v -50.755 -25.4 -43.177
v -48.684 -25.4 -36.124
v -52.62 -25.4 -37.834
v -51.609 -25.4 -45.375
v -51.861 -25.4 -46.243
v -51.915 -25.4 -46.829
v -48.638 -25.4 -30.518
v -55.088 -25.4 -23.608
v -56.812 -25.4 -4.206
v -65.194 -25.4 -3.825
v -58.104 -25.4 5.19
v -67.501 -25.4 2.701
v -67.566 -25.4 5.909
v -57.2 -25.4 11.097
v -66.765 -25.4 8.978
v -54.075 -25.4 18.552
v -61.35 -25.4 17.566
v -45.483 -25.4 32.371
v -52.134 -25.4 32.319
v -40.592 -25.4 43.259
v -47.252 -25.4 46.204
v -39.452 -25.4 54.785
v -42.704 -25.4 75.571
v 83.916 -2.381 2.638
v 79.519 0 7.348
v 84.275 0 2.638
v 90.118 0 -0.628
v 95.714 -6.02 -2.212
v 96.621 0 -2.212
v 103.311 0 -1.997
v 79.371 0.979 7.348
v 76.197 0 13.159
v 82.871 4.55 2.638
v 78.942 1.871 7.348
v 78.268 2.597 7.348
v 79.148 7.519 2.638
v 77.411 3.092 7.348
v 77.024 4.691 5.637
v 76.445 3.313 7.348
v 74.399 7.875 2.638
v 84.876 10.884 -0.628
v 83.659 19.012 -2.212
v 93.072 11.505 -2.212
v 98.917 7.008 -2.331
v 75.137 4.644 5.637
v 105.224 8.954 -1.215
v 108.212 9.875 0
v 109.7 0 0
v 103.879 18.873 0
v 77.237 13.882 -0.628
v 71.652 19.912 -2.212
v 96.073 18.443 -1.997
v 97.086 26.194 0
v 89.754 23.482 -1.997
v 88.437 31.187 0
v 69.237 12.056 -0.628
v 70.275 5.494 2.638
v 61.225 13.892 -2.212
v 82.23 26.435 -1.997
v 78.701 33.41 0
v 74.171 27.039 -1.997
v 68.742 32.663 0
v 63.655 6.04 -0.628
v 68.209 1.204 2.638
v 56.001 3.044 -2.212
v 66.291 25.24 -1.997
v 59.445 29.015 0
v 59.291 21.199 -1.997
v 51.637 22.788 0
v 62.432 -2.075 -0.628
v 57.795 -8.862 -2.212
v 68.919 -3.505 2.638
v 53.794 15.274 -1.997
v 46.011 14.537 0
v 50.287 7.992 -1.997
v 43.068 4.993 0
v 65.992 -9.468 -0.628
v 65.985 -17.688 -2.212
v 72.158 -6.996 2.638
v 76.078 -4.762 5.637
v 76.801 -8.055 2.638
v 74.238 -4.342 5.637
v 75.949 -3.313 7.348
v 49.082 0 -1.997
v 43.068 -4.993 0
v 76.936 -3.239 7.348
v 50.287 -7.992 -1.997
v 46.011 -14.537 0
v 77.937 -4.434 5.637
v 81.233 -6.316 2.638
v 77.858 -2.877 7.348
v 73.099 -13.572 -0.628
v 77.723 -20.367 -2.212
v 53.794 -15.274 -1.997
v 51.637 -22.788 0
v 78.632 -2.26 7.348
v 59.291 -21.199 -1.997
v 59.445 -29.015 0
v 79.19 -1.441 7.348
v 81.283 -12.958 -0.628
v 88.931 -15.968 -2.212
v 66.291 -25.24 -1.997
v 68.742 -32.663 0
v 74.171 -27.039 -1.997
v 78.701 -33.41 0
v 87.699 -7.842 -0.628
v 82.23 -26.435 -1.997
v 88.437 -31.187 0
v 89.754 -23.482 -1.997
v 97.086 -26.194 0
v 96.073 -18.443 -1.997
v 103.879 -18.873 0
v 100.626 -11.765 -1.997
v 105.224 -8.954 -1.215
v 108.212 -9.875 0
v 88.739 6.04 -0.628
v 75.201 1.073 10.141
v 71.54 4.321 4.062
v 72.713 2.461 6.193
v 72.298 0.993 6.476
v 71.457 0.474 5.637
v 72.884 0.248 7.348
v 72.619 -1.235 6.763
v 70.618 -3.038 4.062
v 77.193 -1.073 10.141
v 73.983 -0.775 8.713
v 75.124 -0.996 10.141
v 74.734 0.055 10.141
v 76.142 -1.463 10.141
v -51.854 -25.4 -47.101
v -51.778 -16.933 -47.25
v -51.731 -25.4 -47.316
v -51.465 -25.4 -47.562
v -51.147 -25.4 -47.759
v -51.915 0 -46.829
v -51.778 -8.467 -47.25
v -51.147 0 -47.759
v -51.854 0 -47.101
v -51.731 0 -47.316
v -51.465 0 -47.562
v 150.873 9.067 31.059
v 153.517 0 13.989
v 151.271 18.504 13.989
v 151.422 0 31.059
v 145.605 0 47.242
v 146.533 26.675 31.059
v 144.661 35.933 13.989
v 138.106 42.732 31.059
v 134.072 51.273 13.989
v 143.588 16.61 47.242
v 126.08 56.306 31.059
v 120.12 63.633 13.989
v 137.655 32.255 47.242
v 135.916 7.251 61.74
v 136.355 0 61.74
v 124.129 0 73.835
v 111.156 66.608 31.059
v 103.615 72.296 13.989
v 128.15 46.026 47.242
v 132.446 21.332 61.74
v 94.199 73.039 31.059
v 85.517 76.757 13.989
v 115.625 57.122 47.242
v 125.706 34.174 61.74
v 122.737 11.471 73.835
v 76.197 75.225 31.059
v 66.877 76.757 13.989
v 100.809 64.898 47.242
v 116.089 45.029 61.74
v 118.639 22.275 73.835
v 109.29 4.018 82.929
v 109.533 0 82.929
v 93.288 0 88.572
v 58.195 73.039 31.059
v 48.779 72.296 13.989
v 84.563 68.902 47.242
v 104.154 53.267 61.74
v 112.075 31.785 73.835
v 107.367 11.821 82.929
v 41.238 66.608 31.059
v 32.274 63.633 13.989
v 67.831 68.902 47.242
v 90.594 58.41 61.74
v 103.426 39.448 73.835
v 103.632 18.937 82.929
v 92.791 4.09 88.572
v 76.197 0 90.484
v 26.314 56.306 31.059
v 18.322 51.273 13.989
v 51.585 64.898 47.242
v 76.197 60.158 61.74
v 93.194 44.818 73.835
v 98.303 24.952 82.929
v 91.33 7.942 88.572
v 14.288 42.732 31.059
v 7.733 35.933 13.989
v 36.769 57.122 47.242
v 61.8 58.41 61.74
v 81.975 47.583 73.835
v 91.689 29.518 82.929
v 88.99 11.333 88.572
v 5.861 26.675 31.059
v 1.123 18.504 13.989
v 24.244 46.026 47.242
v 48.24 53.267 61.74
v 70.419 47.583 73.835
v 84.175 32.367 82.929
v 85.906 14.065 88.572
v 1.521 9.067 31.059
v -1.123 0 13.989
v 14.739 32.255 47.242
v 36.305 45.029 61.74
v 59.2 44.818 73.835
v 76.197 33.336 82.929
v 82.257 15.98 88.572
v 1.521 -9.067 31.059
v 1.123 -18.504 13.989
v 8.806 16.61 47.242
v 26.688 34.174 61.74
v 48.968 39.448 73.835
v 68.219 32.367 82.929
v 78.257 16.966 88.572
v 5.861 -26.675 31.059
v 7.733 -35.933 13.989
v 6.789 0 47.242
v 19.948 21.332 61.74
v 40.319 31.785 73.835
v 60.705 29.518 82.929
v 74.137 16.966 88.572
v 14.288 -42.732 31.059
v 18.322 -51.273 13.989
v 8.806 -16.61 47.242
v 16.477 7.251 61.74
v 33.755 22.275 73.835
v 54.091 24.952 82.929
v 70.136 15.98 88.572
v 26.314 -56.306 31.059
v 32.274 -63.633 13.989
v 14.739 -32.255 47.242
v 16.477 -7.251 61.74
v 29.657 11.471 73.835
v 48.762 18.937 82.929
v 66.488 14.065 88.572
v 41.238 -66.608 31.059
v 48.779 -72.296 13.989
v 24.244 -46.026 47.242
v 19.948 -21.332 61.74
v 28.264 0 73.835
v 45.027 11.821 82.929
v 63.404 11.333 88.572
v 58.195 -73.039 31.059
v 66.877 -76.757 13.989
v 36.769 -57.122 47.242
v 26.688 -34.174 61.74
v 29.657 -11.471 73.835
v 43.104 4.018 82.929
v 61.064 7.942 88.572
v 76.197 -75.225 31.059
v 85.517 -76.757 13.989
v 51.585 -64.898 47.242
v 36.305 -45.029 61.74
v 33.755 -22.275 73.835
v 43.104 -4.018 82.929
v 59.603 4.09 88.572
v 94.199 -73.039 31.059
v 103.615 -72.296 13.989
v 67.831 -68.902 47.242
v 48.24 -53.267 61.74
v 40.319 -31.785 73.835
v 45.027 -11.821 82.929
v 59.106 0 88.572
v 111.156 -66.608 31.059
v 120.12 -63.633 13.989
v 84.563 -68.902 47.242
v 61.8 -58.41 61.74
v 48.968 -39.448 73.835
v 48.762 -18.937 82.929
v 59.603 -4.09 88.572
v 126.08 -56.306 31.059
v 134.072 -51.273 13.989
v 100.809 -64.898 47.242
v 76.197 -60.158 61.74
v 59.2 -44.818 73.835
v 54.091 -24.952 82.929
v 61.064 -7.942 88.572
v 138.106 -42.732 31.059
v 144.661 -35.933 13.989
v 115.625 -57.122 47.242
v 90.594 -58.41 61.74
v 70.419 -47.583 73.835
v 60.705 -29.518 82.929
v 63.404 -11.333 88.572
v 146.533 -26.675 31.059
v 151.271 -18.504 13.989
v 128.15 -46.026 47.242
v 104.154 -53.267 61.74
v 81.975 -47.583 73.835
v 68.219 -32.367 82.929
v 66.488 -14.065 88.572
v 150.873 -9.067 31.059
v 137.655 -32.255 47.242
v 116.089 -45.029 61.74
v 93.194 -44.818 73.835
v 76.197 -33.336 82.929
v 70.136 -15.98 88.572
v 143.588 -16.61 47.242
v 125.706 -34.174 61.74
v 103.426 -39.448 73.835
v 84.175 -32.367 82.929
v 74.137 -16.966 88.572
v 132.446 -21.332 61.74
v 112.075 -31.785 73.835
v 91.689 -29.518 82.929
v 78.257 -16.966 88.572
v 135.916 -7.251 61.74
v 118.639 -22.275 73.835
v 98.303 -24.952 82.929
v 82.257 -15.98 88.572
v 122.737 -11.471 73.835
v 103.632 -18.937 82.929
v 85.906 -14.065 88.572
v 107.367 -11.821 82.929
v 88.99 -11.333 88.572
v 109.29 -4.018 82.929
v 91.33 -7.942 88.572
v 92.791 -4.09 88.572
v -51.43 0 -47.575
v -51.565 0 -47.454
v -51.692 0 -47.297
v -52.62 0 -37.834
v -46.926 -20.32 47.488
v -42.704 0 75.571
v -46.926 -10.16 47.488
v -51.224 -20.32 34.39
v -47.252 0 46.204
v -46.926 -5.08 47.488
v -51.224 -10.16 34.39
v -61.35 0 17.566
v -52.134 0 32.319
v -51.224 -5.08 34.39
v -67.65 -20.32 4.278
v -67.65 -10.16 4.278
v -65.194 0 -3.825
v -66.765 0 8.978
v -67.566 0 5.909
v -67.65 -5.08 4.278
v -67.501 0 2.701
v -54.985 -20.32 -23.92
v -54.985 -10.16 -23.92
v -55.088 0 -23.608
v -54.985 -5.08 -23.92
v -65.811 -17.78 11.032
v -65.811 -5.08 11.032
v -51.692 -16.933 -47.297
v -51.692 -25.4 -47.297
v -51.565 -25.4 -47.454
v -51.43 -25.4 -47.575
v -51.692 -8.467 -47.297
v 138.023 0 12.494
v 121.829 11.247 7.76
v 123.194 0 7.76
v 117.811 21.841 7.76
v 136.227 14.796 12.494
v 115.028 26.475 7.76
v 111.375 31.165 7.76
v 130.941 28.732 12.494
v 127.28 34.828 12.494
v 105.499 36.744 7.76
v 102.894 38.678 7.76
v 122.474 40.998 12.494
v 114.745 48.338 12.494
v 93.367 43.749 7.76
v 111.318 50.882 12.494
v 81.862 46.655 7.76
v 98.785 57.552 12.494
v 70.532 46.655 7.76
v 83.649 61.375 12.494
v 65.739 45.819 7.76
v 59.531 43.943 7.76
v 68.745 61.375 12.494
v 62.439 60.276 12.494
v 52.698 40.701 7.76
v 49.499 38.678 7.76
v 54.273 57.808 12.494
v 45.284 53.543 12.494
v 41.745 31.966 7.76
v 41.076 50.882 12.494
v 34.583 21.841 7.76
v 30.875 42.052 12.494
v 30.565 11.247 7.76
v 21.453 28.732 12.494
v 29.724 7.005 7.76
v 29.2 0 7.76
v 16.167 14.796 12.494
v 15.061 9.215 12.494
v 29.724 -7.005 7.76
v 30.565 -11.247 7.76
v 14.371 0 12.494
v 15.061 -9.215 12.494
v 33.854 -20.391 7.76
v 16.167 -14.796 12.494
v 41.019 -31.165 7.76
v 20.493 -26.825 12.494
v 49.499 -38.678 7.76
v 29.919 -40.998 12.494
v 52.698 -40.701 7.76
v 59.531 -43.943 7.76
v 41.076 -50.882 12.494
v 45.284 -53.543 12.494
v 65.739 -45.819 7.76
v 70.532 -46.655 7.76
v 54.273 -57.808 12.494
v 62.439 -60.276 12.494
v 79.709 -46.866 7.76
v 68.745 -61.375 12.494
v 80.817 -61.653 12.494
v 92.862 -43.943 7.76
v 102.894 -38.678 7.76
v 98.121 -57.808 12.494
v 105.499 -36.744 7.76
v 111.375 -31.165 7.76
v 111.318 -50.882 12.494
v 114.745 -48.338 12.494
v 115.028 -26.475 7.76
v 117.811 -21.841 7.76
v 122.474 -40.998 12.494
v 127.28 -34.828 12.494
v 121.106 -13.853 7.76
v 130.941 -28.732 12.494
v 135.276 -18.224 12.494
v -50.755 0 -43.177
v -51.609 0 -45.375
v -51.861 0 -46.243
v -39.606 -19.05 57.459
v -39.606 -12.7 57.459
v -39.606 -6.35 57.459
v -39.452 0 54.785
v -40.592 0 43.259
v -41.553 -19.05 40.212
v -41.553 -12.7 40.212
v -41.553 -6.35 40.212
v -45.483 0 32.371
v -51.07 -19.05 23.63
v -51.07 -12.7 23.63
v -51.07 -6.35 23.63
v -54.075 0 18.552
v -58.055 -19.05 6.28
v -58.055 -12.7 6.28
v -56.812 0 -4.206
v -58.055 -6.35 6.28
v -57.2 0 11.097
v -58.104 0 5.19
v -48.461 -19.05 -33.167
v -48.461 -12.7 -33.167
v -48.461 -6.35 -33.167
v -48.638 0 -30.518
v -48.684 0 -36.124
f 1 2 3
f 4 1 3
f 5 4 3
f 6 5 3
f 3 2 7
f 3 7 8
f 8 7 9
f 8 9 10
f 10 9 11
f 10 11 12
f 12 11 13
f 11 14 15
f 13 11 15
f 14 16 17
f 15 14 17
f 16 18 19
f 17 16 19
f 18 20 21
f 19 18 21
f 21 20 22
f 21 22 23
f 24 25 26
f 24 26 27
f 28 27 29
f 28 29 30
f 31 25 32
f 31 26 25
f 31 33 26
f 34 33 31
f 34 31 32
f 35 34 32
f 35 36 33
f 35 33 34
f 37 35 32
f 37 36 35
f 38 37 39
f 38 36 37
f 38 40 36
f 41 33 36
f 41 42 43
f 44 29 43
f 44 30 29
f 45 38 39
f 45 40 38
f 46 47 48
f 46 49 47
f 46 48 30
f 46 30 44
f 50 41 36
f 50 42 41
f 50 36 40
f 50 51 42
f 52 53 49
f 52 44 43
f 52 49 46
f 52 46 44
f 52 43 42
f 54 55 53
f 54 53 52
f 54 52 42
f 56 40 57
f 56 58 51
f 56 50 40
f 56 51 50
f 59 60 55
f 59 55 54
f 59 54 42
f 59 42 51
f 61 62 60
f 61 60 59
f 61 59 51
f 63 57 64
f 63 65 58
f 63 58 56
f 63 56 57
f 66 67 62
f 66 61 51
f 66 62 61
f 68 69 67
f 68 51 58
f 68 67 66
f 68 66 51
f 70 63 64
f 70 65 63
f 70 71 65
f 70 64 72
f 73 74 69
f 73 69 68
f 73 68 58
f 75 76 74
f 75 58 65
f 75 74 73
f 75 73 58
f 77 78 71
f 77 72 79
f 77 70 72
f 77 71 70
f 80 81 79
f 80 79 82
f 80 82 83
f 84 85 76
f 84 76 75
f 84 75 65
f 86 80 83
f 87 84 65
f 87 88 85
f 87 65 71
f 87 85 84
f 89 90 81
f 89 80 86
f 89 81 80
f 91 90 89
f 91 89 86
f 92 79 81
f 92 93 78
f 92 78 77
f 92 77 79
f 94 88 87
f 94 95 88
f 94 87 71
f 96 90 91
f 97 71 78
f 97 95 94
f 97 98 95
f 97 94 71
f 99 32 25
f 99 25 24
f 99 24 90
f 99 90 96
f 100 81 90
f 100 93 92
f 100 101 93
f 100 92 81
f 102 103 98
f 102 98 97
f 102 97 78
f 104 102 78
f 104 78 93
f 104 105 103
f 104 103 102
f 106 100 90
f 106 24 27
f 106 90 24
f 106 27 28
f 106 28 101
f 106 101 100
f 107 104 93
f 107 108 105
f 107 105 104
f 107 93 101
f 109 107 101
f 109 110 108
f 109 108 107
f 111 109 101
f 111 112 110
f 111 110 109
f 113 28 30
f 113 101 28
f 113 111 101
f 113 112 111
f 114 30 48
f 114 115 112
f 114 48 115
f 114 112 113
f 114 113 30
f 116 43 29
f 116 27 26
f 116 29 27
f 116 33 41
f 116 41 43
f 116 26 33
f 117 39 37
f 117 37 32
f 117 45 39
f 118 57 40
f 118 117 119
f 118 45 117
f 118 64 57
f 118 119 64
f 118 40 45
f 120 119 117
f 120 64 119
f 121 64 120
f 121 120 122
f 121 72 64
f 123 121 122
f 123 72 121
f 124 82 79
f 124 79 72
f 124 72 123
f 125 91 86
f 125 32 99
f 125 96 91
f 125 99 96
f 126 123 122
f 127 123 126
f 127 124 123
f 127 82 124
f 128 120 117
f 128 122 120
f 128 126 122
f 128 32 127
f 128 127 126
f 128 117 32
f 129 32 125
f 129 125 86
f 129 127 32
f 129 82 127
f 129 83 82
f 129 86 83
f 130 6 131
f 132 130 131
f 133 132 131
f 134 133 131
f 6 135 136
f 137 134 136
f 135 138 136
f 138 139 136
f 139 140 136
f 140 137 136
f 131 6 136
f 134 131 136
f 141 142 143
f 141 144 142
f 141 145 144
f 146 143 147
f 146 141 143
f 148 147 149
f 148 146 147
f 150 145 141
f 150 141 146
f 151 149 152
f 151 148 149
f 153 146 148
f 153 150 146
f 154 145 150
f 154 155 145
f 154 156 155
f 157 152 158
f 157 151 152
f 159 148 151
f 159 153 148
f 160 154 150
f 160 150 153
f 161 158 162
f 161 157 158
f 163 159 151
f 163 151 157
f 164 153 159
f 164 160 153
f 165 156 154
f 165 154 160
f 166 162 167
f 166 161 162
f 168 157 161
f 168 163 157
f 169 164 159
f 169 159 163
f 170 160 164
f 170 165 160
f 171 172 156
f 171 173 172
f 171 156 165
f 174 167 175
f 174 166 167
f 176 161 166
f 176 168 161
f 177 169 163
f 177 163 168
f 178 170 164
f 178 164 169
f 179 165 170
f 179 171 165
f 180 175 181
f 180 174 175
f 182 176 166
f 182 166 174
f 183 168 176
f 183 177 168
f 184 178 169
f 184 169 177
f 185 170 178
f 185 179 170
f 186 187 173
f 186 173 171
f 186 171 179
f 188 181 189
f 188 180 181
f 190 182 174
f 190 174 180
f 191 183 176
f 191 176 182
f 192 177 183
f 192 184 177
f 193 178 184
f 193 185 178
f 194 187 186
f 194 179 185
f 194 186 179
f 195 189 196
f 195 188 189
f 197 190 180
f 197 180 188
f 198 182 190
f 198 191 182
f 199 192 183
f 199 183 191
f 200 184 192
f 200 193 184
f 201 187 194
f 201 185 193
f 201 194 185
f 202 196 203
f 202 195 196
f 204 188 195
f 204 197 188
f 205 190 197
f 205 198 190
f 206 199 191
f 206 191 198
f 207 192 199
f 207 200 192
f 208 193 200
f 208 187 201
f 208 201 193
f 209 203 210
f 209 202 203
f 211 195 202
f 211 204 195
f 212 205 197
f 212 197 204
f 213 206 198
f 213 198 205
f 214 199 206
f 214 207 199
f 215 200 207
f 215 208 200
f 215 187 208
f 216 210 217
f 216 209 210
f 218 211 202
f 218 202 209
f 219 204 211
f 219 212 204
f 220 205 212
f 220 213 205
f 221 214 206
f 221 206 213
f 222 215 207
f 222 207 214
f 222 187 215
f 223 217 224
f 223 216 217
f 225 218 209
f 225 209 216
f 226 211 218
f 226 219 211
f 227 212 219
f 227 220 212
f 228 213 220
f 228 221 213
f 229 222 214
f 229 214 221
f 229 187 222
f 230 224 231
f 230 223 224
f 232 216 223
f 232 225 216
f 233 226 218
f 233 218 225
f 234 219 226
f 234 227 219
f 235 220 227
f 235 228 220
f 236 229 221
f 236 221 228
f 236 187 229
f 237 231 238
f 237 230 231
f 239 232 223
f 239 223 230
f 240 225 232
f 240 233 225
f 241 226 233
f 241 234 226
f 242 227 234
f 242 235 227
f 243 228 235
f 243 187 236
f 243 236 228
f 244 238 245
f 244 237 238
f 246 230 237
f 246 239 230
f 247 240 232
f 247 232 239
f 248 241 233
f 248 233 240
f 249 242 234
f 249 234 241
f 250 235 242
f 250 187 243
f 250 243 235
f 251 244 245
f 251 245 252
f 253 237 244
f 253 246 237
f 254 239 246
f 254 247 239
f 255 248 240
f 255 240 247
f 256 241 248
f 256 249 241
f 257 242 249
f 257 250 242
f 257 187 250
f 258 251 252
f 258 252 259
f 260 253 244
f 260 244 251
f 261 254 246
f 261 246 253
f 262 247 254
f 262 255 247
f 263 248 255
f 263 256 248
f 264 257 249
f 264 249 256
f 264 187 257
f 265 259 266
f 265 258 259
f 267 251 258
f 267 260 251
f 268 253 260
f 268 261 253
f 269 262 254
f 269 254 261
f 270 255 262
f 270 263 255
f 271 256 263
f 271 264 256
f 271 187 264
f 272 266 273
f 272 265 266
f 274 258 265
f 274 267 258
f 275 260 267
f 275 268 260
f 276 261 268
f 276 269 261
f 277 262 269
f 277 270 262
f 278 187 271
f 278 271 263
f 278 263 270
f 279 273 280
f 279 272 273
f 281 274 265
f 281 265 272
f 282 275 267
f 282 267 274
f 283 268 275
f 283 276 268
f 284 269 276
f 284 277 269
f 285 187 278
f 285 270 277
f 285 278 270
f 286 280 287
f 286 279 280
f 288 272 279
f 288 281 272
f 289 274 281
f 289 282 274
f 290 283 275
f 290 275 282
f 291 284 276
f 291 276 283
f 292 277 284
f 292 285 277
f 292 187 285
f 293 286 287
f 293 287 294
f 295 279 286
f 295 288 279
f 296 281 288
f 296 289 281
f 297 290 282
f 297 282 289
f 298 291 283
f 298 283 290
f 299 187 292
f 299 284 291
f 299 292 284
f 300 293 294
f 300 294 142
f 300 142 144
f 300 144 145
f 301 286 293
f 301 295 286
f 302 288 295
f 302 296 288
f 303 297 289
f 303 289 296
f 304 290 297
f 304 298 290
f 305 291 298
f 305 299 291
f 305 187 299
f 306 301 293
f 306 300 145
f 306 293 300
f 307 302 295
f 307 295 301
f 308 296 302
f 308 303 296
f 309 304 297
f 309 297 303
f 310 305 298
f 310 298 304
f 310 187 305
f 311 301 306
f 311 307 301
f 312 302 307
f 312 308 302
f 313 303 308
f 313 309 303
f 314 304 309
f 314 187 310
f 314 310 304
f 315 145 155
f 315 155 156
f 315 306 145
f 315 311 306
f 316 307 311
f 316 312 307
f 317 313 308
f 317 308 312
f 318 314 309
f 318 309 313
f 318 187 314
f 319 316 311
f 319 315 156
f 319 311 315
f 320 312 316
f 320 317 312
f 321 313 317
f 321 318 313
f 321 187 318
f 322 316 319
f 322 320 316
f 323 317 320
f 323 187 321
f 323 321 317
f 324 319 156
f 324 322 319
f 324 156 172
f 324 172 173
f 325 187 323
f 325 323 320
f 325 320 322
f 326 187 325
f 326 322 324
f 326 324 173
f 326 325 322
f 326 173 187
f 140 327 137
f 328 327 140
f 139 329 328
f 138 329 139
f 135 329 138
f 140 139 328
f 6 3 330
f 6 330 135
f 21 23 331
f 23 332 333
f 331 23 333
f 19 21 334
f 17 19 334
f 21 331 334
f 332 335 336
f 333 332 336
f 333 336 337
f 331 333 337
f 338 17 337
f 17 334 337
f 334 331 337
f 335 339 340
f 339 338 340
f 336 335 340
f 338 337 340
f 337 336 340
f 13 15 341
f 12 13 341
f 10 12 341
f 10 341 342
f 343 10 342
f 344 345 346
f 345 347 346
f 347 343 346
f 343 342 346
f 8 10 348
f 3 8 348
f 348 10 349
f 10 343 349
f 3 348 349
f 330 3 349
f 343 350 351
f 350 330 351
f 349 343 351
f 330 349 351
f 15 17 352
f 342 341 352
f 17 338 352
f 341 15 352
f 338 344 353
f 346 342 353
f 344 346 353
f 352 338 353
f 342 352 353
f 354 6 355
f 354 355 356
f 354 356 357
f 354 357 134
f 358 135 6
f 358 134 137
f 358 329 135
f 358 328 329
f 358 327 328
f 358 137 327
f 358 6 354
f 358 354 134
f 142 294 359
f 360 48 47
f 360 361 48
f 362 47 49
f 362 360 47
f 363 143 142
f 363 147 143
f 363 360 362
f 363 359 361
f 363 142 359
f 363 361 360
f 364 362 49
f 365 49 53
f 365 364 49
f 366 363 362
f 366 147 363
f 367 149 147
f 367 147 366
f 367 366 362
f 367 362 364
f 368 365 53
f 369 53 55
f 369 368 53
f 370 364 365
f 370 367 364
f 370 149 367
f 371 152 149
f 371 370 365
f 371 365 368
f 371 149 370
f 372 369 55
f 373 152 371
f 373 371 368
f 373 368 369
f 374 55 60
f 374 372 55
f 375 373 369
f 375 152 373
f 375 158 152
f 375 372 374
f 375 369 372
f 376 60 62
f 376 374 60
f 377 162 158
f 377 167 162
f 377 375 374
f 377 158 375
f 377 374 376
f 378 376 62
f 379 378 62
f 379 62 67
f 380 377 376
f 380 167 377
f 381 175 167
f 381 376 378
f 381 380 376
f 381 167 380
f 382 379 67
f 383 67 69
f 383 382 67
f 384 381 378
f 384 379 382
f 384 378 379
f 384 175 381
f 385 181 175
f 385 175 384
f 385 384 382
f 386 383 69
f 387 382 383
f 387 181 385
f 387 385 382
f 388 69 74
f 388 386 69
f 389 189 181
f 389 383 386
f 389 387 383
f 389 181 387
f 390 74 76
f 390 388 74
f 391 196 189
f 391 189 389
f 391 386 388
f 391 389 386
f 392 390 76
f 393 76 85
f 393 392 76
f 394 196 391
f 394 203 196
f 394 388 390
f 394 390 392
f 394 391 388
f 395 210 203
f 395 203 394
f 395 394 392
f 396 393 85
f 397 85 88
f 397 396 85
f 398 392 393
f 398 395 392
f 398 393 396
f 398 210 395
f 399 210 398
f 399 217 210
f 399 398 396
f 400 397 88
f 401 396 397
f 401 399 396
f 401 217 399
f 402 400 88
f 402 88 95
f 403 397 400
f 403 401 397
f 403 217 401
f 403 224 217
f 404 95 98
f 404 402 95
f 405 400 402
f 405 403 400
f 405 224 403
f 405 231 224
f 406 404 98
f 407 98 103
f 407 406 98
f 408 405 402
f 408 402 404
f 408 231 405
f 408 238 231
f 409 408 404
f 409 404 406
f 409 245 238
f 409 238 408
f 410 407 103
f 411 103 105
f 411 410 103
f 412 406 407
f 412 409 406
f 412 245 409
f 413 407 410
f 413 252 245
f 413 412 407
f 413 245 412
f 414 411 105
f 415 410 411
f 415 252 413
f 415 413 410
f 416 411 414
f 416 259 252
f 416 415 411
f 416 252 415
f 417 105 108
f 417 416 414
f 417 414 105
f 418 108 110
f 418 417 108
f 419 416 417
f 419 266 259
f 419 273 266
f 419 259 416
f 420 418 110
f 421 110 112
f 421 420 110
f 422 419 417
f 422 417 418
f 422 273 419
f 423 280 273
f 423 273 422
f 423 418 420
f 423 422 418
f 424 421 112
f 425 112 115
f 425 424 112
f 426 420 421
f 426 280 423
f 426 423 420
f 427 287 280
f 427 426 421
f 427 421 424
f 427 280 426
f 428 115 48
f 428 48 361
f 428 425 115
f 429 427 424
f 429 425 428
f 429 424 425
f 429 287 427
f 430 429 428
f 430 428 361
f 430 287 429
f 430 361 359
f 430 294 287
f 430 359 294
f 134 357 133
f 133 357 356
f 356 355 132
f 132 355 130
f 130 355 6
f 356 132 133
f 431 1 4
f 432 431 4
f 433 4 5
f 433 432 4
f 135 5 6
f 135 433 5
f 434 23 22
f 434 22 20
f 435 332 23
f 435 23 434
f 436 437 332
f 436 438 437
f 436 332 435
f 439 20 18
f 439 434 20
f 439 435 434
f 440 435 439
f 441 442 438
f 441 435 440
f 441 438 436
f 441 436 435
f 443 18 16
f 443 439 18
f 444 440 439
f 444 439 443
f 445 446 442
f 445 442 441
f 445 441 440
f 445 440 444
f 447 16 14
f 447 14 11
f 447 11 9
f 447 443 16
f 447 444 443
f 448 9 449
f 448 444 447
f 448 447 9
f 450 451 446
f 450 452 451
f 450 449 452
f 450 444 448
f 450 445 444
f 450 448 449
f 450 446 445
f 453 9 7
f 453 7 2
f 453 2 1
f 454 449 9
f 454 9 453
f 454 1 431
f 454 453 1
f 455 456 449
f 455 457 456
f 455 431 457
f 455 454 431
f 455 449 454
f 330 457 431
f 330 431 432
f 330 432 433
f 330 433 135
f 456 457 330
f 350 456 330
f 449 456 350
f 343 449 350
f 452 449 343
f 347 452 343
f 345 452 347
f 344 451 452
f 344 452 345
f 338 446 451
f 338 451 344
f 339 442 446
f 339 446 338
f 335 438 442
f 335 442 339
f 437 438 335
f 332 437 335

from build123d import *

# Parameters (mm, degrees)
F3_DEPTH = 25.4


with BuildPart() as f1:
    # F0 (on Front) → F1 (revolve)
    with BuildSketch(Plane.XZ):
        with BuildLine():
            ThreePointArc((109.700255096, 0), (130.4826152428, 10.5220725725), (153.5173356533, 13.9893712476))
            ThreePointArc((153.5173356533, 13.9893712476), (130.5795312432, 68.1288024678), (76.1969305056, 90.4839723626))
            Line((76.1969305056, 90.4839723626), (76.1969305056, 13.1591096957))
            ThreePointArc((76.1969305056, 13.1591096957), (90.1176149548, -0.6281645097), (109.700255096, 0))
        make_face()
    revolve(axis=Axis((76.1969305056, 0, 51.8215410291), (0, 0, 1)))


with BuildPart() as f3:
    # F2 (on Front) → F3 (new body)
    with BuildSketch(Plane.XZ):
        with BuildLine():
            add(Edge.make_bspline(
                [(-51.9147328996, -46.8287542572), (-51.719243746, -47.4230017526), (-51.4331996062, -47.5907681509), (-51.1471554637, -47.7585345507)],
                knots=[0.958670859, 0.958670859, 0.958670859, 0.958670859, 1, 1, 1, 1], degree=3))
            add(Edge.make_bspline(
                [(-51.9147329023, -46.8287542578), (-51.8729501529, -47.3393676714), (-51.5100528103, -47.5489511099), (-51.1471554637, -47.7585345507)],
                knots=[0.9529025772, 0.9529025772, 0.9529025772, 0.9529025772, 1, 1, 1, 1], degree=3))
        make_face()
    extrude(amount=F3_DEPTH)


with BuildPart() as f3b:
    # F2 (on Front) → F3, piece 2 (new body)
    with BuildSketch(Plane.XZ):
        with BuildLine():
            add(Edge.make_bspline(
                [(-42.7038706839, 75.5712911487), (-40.0777723456, 63.4005560856), (-34.7396327057, 38.6607806019), (-69.0317696754, 8.1553012163), (-42.3194415279, -30.8842450909), (-52.0575780585, -45.0830898231), (-51.9147329032, -46.8287542462)],
                knots=[0, 0, 0, 0, 0.2551233501, 0.5185959903, 0.7918878218, 0.9529025772, 0.9529025772, 0.9529025772, 0.9529025772], degree=3))
            add(Edge.make_bspline(
                [(-42.7038706839, 75.5712911487), (-43.6823299334, 66.1096226405), (-45.618214968, 47.3896785271), (-55.6033582178, 22.2650005574), (-74.7504029058, 4.11613276), (-50.8728954972, -20.9854214489), (-52.7706598165, -44.2269094861), (-51.9147329032, -46.8287542462)],
                knots=[0, 0, 0, 0, 0.2005826372, 0.3968534466, 0.5684483596, 0.7777159404, 0.958670859, 0.958670859, 0.958670859, 0.958670859], degree=3))
        make_face()
    extrude(amount=F3_DEPTH)


solid = Compound([f1.part, f3.part, f3b.part])
